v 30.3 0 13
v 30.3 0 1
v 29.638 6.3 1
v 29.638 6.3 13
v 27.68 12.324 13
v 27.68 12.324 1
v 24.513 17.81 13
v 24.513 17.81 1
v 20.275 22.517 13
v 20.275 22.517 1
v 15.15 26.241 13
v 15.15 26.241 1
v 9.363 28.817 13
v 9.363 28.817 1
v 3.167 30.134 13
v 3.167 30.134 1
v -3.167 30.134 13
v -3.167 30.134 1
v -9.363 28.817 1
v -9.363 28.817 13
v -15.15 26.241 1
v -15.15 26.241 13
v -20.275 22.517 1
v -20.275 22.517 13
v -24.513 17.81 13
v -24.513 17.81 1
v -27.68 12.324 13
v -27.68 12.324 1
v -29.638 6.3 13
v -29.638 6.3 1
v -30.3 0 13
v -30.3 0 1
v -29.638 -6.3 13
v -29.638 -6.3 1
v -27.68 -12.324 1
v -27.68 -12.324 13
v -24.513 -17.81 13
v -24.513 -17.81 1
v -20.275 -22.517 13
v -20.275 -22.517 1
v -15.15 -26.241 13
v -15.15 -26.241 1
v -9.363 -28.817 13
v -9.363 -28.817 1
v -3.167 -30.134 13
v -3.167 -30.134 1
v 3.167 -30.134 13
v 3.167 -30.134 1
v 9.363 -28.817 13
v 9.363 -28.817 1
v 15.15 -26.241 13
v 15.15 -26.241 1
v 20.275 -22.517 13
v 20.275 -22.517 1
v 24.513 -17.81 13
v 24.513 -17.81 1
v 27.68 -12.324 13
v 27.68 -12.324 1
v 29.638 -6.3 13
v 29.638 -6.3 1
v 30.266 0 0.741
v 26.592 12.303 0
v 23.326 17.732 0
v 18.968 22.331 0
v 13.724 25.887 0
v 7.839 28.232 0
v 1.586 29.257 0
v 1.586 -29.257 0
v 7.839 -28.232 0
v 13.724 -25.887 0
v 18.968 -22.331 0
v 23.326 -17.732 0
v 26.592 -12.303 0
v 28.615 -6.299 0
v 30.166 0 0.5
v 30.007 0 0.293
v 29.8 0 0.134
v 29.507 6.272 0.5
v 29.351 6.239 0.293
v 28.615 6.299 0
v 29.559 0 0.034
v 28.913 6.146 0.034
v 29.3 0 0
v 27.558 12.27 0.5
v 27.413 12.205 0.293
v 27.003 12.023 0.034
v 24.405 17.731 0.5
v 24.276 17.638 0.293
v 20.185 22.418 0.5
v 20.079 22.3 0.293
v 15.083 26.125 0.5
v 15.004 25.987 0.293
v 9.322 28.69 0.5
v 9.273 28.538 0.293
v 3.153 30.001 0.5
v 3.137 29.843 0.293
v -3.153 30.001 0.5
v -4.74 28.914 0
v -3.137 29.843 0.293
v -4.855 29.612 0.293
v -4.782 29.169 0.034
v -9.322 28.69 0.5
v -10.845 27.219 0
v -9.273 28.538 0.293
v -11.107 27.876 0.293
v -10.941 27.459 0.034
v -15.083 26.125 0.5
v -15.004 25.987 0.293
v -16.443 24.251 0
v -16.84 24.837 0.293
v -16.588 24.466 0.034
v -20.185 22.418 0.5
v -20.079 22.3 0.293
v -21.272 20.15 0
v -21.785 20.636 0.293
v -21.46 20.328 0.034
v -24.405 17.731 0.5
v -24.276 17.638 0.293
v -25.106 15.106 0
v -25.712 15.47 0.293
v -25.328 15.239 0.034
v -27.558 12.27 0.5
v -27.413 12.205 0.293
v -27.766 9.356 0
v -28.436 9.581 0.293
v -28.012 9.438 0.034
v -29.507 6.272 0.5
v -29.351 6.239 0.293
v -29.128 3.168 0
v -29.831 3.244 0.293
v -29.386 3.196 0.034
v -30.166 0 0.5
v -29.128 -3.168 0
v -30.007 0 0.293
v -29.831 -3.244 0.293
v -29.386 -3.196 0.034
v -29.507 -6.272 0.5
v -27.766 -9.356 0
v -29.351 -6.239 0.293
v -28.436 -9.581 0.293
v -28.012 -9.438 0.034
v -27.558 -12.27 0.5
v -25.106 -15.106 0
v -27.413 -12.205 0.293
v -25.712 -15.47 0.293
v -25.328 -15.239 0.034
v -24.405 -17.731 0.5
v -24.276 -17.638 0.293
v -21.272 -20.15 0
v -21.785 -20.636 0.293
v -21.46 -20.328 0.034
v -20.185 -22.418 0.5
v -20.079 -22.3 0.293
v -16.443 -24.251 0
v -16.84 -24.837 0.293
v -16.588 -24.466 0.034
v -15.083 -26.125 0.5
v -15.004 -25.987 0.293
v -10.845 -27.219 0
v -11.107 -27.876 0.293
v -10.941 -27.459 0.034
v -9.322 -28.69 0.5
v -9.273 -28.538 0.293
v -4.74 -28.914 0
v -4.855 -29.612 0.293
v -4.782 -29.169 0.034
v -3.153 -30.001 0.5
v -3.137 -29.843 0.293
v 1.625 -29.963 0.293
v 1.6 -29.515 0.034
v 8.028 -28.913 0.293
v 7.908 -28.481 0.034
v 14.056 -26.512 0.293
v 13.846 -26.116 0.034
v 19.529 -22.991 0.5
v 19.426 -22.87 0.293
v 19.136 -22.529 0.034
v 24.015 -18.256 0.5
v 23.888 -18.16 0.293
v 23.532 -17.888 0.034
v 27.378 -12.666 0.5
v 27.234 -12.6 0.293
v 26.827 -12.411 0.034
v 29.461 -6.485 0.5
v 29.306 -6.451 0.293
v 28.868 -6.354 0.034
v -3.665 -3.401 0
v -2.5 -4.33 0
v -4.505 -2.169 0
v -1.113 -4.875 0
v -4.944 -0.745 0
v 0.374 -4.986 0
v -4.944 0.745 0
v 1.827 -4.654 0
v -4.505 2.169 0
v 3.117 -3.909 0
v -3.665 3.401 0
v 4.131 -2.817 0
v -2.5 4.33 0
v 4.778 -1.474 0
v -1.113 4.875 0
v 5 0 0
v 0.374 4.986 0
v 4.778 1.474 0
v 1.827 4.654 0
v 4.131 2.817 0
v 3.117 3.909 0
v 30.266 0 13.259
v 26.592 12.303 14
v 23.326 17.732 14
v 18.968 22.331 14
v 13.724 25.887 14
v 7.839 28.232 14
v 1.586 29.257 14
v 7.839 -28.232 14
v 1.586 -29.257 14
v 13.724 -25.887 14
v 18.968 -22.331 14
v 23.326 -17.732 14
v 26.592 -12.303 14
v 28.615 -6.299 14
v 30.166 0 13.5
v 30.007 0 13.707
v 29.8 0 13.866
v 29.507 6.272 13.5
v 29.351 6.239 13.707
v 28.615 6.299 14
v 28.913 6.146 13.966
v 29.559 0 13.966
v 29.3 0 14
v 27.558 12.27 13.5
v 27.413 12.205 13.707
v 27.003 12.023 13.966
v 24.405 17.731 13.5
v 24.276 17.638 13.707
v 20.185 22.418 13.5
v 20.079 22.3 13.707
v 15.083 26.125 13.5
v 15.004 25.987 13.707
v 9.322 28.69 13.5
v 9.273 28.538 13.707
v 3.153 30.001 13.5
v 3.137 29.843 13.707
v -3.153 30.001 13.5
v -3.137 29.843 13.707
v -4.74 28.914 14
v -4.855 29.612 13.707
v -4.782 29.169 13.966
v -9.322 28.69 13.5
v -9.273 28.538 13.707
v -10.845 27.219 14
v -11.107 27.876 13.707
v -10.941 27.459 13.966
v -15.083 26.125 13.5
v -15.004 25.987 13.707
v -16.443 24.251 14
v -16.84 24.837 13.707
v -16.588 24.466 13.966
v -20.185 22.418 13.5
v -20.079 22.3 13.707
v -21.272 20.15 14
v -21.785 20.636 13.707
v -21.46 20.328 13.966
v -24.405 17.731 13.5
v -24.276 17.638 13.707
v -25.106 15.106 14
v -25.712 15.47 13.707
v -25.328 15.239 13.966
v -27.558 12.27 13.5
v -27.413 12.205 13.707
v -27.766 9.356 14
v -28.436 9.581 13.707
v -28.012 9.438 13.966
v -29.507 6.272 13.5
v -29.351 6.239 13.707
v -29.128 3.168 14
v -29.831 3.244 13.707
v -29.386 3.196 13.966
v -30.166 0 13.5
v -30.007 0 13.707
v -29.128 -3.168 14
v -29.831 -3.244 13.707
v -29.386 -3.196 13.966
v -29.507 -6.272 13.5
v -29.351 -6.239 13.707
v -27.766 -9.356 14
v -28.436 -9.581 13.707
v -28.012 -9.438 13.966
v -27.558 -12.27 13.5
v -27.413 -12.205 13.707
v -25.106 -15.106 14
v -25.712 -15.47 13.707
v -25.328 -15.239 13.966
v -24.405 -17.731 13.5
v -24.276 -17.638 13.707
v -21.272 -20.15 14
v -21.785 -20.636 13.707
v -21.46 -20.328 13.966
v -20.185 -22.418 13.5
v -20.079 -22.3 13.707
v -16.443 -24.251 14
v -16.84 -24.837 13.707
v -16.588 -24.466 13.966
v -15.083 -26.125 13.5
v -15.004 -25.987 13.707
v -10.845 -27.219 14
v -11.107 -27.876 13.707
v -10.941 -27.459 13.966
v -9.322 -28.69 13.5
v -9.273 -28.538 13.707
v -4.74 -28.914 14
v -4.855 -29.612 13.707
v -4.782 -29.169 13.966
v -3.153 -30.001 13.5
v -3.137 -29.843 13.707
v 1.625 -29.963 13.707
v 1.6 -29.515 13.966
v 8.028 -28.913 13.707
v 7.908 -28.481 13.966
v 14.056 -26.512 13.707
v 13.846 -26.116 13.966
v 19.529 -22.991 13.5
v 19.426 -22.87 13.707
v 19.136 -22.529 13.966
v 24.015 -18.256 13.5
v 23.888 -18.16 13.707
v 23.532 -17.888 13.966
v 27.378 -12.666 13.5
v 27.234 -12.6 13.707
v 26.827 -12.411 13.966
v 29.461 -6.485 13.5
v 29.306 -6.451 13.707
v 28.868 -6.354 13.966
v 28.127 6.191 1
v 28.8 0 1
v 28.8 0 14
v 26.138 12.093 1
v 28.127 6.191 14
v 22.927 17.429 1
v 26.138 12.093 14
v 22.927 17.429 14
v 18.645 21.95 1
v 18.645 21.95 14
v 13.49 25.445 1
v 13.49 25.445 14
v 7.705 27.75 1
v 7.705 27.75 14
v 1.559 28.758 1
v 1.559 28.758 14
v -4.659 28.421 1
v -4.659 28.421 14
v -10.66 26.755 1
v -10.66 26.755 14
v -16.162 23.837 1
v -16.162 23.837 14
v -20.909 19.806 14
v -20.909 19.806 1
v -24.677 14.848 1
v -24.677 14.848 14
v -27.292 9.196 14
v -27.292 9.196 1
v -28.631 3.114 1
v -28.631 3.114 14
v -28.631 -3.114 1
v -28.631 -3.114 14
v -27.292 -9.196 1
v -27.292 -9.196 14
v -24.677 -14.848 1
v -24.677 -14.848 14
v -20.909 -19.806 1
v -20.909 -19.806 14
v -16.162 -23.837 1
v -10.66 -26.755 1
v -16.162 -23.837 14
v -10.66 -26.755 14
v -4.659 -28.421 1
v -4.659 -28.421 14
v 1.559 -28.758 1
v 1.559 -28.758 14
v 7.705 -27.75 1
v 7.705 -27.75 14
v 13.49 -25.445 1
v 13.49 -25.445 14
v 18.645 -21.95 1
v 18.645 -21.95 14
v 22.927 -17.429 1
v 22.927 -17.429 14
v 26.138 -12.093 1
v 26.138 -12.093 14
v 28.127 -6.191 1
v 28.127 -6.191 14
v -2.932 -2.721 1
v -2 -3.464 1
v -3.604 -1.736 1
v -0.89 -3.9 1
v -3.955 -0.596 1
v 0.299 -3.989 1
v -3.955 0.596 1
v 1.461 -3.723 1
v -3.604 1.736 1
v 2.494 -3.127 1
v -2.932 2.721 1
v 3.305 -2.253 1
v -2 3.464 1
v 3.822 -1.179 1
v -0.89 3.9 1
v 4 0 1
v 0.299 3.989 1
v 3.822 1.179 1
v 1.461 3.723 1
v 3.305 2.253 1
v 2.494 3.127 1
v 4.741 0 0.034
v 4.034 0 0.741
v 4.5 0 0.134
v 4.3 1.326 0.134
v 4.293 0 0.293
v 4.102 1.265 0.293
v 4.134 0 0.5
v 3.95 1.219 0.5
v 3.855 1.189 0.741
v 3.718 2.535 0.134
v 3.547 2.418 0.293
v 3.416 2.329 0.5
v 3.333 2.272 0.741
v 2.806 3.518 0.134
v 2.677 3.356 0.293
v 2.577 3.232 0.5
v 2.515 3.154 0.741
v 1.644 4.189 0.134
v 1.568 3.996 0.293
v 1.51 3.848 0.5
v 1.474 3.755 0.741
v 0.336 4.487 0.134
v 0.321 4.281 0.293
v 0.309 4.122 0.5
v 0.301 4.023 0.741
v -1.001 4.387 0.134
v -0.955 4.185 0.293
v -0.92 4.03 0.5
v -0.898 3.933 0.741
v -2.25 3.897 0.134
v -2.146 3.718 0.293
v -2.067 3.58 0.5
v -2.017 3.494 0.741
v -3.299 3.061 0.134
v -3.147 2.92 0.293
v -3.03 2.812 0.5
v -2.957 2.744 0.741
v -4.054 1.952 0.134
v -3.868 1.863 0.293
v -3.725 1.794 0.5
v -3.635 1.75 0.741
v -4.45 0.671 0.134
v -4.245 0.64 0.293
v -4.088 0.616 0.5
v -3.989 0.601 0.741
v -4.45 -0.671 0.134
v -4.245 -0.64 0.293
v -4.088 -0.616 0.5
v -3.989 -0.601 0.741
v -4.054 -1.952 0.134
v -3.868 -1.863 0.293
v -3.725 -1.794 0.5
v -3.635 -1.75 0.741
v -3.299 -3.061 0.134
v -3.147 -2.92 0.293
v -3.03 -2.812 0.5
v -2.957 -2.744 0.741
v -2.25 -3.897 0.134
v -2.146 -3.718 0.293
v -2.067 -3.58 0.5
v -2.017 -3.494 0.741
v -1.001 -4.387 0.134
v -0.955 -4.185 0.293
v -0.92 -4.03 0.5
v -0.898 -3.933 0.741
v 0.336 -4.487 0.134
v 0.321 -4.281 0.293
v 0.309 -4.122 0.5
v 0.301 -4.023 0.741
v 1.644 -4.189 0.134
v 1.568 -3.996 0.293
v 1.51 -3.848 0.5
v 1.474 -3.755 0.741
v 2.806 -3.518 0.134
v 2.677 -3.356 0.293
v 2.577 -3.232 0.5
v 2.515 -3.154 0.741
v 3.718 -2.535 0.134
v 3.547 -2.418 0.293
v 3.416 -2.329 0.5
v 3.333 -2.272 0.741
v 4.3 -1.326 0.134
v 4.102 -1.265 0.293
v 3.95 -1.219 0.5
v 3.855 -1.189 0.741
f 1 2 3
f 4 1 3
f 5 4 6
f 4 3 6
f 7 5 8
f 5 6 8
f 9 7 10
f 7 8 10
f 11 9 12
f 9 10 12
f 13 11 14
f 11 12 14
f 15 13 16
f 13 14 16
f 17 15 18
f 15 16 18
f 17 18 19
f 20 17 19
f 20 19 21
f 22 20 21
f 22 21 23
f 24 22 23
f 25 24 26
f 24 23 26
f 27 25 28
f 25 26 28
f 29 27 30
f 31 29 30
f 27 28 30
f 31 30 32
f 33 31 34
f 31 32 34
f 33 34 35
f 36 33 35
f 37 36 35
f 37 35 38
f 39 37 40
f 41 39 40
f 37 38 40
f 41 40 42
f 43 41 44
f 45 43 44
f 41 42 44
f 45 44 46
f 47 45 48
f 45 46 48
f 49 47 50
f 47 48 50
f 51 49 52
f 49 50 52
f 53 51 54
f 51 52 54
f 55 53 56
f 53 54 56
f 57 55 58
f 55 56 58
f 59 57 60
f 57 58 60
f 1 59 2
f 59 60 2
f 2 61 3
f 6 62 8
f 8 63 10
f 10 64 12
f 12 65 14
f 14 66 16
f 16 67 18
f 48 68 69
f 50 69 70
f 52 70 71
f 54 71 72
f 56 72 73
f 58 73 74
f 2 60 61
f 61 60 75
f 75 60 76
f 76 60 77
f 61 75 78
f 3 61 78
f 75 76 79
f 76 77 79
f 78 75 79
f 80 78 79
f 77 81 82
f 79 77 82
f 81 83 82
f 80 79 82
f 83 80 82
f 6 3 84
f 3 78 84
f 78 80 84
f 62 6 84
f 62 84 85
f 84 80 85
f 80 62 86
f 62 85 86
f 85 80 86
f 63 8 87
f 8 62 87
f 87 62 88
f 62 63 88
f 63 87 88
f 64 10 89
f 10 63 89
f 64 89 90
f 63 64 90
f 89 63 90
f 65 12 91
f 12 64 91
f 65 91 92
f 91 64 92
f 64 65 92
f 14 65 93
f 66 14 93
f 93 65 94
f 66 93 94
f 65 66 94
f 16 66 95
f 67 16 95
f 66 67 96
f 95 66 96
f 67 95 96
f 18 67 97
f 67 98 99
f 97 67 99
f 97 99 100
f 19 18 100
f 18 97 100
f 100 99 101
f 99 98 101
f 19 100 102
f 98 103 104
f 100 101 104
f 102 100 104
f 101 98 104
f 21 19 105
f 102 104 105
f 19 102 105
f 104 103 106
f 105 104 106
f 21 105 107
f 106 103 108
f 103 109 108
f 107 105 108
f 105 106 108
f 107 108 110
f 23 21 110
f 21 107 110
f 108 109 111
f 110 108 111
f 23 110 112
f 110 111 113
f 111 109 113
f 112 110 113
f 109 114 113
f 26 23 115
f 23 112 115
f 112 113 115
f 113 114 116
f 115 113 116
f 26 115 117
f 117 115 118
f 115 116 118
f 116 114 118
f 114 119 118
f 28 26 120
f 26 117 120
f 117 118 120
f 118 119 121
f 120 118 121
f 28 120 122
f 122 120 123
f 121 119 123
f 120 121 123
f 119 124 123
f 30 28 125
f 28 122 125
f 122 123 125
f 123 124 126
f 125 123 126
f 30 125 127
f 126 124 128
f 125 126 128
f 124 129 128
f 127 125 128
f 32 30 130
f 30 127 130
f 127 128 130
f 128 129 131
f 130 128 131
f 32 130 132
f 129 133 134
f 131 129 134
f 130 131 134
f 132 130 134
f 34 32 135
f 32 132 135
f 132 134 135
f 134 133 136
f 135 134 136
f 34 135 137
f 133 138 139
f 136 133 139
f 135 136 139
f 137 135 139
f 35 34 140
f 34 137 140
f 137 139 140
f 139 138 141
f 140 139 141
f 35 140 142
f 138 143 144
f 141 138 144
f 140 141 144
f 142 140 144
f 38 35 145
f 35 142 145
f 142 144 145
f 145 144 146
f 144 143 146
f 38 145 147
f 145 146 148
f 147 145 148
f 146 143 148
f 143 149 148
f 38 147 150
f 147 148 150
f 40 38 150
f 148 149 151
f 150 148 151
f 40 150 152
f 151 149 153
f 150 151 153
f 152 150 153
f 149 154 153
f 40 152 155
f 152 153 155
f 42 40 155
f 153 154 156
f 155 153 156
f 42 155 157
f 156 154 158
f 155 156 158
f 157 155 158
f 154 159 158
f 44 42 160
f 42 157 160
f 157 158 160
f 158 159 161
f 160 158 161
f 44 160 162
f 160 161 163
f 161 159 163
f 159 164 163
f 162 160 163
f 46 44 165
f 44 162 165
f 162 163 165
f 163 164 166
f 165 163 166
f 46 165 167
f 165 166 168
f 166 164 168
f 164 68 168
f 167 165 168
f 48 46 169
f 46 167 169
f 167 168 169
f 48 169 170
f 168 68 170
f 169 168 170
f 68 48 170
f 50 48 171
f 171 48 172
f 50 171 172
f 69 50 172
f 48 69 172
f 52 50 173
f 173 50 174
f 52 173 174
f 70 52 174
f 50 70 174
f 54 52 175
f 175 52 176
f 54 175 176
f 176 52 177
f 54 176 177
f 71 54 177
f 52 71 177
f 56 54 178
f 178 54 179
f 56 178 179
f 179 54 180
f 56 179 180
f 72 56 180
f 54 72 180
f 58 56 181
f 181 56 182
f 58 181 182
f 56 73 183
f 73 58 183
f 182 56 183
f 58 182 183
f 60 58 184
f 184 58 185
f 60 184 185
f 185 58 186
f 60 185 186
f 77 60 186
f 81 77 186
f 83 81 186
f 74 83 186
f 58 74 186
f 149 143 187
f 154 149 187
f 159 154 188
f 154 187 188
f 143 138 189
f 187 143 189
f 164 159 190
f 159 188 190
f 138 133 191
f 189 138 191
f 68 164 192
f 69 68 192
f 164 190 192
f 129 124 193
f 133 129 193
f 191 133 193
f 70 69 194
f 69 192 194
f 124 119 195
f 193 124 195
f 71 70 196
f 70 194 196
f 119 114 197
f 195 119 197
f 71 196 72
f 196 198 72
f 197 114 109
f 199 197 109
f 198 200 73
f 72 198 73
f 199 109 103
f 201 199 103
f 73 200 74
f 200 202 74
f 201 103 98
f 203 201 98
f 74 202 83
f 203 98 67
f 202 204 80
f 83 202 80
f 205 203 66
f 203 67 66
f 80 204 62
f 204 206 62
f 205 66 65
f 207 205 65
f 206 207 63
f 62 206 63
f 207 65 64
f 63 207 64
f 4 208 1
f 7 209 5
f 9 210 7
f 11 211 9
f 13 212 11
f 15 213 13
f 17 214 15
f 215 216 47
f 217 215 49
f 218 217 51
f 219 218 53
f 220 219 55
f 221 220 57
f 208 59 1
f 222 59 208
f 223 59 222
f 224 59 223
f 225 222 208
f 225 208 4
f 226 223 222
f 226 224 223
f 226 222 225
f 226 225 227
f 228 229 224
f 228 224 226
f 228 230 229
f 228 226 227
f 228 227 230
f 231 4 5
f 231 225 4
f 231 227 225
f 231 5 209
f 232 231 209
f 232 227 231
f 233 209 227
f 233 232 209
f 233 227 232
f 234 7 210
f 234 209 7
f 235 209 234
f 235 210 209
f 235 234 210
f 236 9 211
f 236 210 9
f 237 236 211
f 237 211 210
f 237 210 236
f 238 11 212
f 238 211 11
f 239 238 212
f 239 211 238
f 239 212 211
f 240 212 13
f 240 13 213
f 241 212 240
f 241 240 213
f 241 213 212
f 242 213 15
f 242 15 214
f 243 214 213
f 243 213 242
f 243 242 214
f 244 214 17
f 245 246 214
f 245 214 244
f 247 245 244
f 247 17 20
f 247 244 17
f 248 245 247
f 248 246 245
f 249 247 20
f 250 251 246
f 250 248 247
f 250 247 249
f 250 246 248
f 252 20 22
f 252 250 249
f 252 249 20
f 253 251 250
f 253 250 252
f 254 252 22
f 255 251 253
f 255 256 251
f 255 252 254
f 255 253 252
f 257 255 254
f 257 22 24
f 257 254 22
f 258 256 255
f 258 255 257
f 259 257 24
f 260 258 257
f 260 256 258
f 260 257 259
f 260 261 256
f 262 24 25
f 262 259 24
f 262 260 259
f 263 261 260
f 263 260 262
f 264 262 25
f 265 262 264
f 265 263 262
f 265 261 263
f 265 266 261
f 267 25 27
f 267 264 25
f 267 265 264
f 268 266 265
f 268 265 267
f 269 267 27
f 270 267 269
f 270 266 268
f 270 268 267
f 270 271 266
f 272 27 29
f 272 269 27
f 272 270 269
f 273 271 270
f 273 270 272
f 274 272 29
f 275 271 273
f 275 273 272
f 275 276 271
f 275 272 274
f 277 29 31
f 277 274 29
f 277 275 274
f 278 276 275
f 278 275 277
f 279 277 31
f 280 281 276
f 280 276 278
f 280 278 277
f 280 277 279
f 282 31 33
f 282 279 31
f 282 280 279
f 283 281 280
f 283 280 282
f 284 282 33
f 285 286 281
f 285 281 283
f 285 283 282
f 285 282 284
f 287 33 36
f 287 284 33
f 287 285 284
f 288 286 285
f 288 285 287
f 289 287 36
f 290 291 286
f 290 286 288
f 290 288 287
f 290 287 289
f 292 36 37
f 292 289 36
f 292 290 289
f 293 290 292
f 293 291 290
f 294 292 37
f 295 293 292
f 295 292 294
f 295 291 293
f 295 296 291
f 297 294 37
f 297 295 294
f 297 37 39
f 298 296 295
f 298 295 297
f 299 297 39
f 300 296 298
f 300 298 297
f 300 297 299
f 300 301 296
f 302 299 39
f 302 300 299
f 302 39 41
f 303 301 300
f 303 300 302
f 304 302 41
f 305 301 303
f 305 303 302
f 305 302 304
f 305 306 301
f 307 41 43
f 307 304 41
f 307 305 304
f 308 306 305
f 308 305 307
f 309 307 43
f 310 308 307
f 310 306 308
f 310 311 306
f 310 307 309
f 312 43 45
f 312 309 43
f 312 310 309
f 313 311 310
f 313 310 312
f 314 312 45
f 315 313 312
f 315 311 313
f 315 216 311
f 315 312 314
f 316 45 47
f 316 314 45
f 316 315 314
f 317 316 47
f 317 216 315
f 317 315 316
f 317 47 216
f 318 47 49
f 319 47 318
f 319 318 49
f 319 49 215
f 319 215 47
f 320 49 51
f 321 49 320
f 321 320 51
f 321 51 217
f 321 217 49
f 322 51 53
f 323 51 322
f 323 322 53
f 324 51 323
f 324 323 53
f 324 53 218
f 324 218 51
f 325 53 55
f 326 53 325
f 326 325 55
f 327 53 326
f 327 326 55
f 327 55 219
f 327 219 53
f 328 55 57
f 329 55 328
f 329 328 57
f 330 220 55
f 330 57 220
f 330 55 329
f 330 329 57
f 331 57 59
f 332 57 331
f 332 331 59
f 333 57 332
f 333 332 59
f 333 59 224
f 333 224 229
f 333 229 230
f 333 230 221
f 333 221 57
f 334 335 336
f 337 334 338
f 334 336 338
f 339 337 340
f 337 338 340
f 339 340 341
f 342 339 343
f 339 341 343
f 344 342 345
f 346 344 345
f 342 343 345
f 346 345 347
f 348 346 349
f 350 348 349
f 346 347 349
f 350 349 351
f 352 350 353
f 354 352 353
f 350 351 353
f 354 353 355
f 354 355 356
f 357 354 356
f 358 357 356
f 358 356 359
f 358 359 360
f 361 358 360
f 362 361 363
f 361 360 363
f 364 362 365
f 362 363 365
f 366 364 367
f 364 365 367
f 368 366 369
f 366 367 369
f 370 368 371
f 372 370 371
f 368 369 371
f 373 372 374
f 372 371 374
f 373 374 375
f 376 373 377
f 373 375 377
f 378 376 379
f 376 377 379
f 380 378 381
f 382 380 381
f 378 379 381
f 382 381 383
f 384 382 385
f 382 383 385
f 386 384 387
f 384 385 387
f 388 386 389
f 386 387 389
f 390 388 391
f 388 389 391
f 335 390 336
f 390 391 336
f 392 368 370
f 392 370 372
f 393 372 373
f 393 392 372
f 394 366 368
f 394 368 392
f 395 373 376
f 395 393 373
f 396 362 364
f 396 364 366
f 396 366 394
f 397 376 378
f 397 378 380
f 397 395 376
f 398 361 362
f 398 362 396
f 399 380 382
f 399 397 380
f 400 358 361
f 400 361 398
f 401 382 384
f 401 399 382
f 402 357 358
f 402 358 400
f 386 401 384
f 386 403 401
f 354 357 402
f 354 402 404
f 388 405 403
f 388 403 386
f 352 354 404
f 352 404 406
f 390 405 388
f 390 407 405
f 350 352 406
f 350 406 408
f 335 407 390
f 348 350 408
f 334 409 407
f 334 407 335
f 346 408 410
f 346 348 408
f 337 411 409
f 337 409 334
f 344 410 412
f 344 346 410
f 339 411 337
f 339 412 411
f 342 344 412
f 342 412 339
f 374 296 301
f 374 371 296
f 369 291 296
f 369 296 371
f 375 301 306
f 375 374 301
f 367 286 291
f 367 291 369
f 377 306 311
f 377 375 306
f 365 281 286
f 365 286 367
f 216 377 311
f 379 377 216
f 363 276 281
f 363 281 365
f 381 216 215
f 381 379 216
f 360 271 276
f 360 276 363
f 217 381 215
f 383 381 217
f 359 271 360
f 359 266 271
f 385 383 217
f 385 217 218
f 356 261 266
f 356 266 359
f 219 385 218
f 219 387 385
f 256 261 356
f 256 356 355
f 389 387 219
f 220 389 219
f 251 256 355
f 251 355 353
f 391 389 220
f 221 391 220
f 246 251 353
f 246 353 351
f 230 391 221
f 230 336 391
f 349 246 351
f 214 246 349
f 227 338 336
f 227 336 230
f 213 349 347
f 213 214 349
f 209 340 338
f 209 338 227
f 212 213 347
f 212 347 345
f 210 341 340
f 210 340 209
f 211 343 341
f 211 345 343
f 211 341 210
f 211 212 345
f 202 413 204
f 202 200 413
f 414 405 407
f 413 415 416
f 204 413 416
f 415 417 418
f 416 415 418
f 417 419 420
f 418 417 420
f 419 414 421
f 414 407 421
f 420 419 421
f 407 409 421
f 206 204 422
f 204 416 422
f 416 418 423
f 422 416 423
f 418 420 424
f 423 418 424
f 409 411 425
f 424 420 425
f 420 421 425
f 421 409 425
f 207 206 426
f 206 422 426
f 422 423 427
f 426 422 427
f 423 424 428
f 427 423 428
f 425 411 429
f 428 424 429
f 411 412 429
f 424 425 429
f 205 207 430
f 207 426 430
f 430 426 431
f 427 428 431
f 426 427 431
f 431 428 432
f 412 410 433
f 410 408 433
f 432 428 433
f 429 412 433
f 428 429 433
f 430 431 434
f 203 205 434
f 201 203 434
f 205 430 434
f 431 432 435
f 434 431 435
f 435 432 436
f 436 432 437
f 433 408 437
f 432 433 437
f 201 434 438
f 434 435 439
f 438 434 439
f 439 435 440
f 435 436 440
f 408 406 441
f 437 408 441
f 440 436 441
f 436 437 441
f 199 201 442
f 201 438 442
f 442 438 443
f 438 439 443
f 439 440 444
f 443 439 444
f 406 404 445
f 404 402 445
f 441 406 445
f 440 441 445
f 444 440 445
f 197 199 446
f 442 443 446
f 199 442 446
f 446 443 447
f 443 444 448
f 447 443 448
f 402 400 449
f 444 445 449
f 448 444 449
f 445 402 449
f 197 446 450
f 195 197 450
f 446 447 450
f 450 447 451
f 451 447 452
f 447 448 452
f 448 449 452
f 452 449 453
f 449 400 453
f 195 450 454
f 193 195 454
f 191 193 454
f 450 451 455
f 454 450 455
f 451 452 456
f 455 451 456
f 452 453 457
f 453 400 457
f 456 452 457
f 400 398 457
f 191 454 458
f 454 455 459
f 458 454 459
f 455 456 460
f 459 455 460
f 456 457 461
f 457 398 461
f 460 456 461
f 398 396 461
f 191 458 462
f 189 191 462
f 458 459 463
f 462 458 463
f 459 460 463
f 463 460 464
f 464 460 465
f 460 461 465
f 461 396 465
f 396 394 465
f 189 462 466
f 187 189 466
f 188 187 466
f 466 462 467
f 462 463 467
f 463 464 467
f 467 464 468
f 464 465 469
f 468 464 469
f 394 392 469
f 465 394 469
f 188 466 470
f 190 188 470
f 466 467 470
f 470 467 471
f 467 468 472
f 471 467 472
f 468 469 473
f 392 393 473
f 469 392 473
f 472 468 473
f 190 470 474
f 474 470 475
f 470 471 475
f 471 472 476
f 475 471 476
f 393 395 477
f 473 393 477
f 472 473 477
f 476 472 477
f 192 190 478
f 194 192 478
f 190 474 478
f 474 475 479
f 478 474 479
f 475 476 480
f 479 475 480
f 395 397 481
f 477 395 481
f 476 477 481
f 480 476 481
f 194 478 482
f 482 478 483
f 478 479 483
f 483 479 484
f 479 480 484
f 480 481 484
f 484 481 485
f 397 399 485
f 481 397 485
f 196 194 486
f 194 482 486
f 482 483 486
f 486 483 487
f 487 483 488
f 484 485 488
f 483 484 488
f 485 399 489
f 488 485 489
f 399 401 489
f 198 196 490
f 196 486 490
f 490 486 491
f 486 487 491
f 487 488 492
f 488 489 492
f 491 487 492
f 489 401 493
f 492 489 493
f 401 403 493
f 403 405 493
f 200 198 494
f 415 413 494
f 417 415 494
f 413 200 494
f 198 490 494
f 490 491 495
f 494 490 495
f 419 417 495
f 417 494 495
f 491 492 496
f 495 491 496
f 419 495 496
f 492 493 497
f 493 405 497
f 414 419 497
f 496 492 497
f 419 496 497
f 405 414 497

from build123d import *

# Parameters (mm, degrees)
F0_R     = 30.3
F1_DEPTH = 14
F2_R     = 28.8
F3_DEPTH = 13
F4_R     = 4
F5_DEPTH = 25.4
F6_R     = 0.99999


# Not quite as in the source:
# - a fillet or chamfer is up to 0.001 mm smaller than in the source, because OpenCascade refuses the exact size


with BuildPart() as f1:
    # F0 (on Top) → F1 (new body)
    with BuildSketch(Plane.XY):
        Circle(F0_R)
    extrude(amount=F1_DEPTH)

    # F2 (on face) → F3 (cut)
    with BuildSketch(Plane.XY.offset(14)):
        Circle(F2_R)
    extrude(amount=-F3_DEPTH, mode=Mode.SUBTRACT)

    # F4 (on face) → F5 (cut)
    with BuildSketch(Plane.XY.offset(1)):
        Circle(F4_R)
    extrude(amount=-F5_DEPTH, mode=Mode.SUBTRACT)

    # F6 (radius 1 in the source; OpenCascade refuses exactly that, so slightly less here)
    f6_edges = [f1.edges().sort_by_distance(p)[0] for p in [
        (-30.3, 0, 0),
        (-4, 0, 0),
        (-30.3, 0, 14),
    ]]
    fillet(f6_edges, radius=F6_R)


solid = f1.part
